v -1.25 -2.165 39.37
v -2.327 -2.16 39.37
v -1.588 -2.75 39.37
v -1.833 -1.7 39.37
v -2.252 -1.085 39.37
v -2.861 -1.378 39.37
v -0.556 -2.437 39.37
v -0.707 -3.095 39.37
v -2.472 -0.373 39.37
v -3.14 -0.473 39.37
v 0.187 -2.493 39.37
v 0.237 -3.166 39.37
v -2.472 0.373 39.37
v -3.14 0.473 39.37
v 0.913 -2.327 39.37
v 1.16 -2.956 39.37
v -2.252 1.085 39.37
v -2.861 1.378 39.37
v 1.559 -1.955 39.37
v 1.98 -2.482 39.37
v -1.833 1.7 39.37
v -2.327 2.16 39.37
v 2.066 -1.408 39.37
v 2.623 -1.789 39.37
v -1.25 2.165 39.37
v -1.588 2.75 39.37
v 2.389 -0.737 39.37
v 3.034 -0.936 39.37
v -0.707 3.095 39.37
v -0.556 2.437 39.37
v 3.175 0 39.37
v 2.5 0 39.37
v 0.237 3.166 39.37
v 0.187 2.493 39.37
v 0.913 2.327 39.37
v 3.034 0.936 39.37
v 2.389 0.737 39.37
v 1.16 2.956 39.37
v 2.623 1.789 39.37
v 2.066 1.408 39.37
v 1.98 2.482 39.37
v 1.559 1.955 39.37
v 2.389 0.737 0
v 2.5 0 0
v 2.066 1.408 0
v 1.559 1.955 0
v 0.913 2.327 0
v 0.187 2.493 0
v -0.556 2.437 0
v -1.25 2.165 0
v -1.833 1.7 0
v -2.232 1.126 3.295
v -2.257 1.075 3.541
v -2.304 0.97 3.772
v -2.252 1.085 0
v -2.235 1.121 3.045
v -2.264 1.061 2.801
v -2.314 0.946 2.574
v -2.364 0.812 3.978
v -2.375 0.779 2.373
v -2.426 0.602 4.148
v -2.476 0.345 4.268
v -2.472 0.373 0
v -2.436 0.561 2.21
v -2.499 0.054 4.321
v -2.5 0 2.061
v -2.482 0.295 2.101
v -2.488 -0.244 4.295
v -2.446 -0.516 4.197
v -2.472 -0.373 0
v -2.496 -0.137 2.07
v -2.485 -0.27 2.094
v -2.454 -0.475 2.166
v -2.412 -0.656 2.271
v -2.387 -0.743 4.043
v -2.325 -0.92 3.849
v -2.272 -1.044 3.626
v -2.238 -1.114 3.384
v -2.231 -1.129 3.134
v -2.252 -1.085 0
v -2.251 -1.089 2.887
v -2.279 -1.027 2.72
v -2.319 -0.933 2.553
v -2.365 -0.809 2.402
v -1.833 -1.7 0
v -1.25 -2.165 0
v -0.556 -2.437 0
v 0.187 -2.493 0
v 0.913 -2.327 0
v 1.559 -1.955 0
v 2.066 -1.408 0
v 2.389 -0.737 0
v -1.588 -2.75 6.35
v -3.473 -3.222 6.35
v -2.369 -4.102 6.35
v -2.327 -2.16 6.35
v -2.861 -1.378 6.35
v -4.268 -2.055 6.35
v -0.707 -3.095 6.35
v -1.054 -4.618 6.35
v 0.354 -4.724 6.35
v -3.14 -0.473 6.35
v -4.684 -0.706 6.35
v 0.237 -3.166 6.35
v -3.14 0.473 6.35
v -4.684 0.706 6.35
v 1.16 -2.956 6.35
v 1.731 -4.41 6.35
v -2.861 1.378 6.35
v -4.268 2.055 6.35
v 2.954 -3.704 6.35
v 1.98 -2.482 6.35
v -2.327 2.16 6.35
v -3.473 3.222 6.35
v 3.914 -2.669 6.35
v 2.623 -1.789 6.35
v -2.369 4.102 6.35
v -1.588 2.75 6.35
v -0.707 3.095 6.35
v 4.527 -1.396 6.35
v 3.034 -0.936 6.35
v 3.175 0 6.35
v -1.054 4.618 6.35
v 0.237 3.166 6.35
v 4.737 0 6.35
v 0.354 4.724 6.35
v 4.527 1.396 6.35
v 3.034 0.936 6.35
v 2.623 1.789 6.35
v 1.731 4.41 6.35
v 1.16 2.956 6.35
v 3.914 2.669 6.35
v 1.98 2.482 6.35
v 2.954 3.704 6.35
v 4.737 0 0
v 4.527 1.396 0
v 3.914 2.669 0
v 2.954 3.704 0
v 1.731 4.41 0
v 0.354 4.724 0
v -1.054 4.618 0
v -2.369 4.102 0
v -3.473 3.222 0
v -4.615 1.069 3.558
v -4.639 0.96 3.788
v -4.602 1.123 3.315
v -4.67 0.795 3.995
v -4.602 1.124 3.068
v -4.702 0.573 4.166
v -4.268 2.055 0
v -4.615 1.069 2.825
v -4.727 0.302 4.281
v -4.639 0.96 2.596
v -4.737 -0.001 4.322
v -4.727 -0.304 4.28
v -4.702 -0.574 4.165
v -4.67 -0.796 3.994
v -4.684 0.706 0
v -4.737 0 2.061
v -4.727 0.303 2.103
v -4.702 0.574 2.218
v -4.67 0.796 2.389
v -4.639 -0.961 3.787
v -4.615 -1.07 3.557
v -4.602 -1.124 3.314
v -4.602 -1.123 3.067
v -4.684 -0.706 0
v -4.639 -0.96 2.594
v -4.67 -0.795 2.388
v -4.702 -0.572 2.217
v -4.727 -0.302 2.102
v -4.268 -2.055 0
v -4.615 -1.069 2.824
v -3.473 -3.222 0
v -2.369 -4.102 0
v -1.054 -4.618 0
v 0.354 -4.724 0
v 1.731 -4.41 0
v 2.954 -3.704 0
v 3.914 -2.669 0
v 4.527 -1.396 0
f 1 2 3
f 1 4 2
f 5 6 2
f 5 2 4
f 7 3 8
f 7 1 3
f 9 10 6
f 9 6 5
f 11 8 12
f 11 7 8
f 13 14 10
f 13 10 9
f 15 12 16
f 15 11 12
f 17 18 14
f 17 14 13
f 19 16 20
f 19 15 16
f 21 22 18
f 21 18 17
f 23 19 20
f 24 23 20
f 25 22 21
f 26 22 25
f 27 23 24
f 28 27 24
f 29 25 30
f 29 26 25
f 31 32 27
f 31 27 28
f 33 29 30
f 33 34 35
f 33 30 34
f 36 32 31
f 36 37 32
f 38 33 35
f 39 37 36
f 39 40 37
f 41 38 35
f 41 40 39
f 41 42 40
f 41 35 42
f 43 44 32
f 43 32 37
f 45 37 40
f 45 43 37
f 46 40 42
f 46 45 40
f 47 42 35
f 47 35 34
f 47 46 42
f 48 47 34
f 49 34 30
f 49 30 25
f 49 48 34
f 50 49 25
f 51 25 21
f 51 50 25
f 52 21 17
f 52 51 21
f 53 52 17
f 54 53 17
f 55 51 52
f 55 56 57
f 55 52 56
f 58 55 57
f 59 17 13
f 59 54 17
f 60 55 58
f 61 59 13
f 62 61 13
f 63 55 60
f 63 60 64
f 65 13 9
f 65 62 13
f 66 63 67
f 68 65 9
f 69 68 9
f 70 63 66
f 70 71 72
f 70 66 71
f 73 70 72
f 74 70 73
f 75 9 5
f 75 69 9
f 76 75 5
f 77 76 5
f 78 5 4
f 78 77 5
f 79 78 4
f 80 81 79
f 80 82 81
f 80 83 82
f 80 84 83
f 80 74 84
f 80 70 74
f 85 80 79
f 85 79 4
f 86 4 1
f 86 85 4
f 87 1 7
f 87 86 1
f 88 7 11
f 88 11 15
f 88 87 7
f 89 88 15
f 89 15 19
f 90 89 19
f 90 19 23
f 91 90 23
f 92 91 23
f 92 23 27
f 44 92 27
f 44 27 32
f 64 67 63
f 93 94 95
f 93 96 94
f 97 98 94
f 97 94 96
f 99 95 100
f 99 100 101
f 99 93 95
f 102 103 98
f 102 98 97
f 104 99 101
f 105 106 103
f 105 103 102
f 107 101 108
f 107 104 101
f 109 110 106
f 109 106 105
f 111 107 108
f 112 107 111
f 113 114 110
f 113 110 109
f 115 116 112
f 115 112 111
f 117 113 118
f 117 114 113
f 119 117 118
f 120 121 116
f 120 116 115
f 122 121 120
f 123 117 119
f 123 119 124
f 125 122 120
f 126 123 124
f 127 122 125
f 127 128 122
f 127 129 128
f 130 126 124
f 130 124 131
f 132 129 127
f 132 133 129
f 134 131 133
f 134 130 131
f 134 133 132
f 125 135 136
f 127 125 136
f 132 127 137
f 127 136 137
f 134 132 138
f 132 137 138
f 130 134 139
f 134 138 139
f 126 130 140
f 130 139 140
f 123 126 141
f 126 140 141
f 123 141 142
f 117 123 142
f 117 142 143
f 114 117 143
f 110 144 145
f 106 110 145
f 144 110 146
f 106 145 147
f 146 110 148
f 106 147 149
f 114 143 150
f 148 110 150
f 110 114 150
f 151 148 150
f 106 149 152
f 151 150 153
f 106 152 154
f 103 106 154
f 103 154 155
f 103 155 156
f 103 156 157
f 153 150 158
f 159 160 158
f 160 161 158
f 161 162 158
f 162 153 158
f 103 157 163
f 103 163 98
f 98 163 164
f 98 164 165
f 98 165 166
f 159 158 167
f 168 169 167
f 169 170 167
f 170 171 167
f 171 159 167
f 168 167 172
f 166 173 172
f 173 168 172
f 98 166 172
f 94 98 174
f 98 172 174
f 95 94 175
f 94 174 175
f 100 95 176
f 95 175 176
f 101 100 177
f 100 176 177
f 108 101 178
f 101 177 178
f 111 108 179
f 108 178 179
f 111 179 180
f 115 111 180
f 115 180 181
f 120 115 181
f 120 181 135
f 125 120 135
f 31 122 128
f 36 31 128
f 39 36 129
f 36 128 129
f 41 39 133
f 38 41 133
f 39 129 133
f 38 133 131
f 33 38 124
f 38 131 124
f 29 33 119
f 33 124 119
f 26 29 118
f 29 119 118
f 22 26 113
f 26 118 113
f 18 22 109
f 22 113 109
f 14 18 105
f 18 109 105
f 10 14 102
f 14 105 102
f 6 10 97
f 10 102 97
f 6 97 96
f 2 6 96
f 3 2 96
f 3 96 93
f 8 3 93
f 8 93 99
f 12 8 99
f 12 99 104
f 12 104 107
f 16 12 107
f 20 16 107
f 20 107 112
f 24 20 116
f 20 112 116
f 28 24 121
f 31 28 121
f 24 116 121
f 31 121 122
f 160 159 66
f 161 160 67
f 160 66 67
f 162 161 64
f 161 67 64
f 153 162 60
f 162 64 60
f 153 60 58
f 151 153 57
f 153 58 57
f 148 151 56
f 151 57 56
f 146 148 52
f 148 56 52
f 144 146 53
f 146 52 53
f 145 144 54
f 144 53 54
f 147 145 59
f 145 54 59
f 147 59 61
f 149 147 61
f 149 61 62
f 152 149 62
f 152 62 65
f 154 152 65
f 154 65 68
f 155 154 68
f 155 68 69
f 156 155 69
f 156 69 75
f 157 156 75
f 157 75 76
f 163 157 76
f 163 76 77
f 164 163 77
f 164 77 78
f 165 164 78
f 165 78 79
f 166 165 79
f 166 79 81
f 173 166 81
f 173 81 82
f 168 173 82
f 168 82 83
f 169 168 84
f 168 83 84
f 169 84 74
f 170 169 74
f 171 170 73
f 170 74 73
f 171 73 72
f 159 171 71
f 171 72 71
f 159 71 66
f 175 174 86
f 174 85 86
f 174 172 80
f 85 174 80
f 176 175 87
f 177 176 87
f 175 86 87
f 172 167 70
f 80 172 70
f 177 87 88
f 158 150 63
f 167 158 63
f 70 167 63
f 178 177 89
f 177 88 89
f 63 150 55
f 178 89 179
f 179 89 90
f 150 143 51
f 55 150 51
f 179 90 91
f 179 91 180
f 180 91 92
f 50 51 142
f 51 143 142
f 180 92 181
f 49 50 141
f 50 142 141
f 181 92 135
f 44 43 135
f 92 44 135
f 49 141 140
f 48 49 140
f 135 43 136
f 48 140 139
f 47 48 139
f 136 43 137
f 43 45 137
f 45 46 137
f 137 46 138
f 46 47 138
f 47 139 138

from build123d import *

# Parameters (mm, degrees)
SKETCH1_R                 = 4.7371
SKETCH1_R_2               = 2.5
BOSS_EXTRUDE1_DEPTH       = 6.35
SKETCH2_R                 = 3.175
SKETCH2_R_2               = 2.5
BOSS_EXTRUDE2_DEPTH       = 33.02
F_4_40_TAPPED_HOLE1_D     = 2.2606
F_4_40_TAPPED_HOLE1_DEPTH = 4.7361
F_4_40_TAPPED_HOLE1_TIP   = 0.679152758


with BuildPart() as part:
    # Sketch1 → Boss-Extrude1 (new body)
    with BuildSketch(Plane.XY):
        Circle(SKETCH1_R)
        Circle(SKETCH1_R_2, mode=Mode.SUBTRACT)
    extrude(amount=BOSS_EXTRUDE1_DEPTH)

    # Sketch2 → Boss-Extrude2 (add)
    with BuildSketch(Plane.XY.offset(6.35)):
        Circle(SKETCH2_R)
        Circle(SKETCH2_R_2, mode=Mode.SUBTRACT)
    extrude(amount=BOSS_EXTRUDE2_DEPTH)

    # #4-40 Tapped Hole1
    with Locations(Plane.ZY.offset(4.7371)):
        with Locations((3.191608174, 0)):
            Hole(F_4_40_TAPPED_HOLE1_D / 2, depth=F_4_40_TAPPED_HOLE1_DEPTH)
            with Locations((0, 0, -(F_4_40_TAPPED_HOLE1_DEPTH + F_4_40_TAPPED_HOLE1_TIP / 2))):  # 118° drill point
                Cone(0, F_4_40_TAPPED_HOLE1_D / 2, F_4_40_TAPPED_HOLE1_TIP, mode=Mode.SUBTRACT)


solid = part.part
